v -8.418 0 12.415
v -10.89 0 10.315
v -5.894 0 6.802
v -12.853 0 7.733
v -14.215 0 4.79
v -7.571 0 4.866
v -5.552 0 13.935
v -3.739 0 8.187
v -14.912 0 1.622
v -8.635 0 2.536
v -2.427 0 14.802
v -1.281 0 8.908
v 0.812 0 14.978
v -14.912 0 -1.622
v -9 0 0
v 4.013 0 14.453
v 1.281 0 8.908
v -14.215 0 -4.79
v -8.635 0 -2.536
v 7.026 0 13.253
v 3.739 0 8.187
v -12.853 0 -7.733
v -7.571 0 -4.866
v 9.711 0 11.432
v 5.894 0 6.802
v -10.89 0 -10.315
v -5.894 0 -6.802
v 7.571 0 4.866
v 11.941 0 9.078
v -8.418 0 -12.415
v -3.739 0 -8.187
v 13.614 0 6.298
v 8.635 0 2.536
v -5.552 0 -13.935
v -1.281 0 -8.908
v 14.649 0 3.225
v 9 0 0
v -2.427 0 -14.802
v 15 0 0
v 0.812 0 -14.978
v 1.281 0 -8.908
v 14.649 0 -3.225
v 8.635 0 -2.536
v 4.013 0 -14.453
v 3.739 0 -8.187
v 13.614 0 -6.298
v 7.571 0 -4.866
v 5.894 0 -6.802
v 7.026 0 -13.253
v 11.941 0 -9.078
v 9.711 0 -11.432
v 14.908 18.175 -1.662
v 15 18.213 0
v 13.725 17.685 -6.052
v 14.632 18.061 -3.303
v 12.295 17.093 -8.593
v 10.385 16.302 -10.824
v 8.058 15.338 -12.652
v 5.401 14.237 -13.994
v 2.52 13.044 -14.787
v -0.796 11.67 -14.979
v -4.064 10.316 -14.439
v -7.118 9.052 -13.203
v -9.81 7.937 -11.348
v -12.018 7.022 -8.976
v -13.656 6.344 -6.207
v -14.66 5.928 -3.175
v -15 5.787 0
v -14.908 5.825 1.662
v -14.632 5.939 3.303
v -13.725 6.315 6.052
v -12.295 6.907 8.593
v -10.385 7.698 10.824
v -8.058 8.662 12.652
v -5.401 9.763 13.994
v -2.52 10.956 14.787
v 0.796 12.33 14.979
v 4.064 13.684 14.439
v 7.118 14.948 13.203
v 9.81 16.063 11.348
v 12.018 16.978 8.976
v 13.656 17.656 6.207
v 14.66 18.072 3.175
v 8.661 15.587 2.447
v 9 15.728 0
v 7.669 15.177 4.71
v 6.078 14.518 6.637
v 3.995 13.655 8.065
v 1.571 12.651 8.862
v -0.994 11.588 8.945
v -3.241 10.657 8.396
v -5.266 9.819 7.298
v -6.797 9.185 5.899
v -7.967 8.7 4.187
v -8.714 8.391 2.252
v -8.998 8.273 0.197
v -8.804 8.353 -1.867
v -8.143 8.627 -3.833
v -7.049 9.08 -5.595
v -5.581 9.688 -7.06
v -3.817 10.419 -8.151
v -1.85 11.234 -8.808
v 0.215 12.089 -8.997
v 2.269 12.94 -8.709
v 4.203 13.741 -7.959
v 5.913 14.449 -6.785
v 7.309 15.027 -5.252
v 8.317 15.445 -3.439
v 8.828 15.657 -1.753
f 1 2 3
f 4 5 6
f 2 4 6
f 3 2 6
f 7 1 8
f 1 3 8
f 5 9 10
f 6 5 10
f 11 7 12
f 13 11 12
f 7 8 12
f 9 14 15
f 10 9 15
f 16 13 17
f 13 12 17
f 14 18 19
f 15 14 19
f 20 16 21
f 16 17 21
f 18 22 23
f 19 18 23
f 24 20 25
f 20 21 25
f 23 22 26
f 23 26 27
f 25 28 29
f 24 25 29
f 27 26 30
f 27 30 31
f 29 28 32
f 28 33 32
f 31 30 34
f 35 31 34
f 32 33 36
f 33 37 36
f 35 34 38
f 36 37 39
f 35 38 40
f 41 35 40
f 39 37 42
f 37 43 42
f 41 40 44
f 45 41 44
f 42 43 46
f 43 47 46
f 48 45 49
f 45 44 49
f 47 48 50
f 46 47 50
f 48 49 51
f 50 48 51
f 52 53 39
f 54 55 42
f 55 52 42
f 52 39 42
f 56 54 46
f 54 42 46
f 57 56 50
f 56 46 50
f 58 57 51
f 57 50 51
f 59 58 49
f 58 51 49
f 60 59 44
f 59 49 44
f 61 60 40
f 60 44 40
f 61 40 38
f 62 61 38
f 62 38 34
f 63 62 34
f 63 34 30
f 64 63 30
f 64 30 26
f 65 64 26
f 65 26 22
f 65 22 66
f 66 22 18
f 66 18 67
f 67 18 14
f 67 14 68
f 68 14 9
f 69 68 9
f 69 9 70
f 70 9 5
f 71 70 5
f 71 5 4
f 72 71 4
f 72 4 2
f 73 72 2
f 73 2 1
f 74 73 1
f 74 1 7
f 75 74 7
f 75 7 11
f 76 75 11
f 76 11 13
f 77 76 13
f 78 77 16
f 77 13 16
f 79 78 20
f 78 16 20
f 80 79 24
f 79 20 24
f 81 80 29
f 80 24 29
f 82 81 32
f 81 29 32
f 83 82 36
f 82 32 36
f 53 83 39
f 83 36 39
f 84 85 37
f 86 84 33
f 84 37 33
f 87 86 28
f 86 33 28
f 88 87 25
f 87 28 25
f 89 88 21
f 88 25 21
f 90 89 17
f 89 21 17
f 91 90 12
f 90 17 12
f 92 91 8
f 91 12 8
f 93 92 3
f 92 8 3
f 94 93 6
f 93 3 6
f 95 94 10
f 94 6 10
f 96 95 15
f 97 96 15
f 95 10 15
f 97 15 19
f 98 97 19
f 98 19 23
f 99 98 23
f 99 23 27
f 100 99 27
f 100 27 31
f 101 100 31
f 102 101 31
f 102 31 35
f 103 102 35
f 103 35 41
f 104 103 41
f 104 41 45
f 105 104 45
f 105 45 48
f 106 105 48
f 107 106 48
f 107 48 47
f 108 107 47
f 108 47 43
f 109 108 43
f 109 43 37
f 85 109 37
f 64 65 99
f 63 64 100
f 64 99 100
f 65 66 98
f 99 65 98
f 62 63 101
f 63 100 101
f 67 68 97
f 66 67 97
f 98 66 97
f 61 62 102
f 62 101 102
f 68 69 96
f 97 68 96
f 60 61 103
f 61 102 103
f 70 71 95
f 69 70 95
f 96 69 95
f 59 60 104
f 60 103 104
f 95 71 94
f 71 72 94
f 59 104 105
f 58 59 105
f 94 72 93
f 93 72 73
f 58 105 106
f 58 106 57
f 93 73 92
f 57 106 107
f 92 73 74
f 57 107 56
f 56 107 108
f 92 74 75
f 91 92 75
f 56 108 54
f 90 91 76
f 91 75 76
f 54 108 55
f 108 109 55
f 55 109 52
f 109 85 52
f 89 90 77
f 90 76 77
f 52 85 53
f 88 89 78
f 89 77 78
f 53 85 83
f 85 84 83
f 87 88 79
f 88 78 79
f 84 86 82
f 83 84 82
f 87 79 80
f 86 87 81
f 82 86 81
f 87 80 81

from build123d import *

# Parameters (mm, degrees)
SKETCH_1_R          = 15
EXTRUDE_1_DEPTH     = 20
CUT_EXTRUDE_1_DEPTH = 16.5
SKETCH_7_R          = 9
CUT_EXTRUDE_2_DEPTH = 24.5


with BuildPart() as part:
    # 草图1 → 凸台-拉伸1 (new body)
    with BuildSketch(Plane(origin=(0, 0, 0), x_dir=(1, 0, 0), z_dir=(0, 1, 0))):
        Circle(SKETCH_1_R)
    extrude(amount=EXTRUDE_1_DEPTH)

    # 草图2 → 切除-拉伸1 (cut, symmetric)
    with BuildSketch(Plane.XY):
        Polygon((-15, 5.786796564), (15, 18.213203436), (15, 34.074049074), (-15, 34.074049074), align=None)
    extrude(amount=CUT_EXTRUDE_1_DEPTH, both=True, mode=Mode.SUBTRACT)

    # 草图7 → 切除-拉伸2 (cut)
    with BuildSketch(Plane.XZ):
        Circle(SKETCH_7_R)
    extrude(amount=-CUT_EXTRUDE_2_DEPTH, mode=Mode.SUBTRACT)


solid = part.part
